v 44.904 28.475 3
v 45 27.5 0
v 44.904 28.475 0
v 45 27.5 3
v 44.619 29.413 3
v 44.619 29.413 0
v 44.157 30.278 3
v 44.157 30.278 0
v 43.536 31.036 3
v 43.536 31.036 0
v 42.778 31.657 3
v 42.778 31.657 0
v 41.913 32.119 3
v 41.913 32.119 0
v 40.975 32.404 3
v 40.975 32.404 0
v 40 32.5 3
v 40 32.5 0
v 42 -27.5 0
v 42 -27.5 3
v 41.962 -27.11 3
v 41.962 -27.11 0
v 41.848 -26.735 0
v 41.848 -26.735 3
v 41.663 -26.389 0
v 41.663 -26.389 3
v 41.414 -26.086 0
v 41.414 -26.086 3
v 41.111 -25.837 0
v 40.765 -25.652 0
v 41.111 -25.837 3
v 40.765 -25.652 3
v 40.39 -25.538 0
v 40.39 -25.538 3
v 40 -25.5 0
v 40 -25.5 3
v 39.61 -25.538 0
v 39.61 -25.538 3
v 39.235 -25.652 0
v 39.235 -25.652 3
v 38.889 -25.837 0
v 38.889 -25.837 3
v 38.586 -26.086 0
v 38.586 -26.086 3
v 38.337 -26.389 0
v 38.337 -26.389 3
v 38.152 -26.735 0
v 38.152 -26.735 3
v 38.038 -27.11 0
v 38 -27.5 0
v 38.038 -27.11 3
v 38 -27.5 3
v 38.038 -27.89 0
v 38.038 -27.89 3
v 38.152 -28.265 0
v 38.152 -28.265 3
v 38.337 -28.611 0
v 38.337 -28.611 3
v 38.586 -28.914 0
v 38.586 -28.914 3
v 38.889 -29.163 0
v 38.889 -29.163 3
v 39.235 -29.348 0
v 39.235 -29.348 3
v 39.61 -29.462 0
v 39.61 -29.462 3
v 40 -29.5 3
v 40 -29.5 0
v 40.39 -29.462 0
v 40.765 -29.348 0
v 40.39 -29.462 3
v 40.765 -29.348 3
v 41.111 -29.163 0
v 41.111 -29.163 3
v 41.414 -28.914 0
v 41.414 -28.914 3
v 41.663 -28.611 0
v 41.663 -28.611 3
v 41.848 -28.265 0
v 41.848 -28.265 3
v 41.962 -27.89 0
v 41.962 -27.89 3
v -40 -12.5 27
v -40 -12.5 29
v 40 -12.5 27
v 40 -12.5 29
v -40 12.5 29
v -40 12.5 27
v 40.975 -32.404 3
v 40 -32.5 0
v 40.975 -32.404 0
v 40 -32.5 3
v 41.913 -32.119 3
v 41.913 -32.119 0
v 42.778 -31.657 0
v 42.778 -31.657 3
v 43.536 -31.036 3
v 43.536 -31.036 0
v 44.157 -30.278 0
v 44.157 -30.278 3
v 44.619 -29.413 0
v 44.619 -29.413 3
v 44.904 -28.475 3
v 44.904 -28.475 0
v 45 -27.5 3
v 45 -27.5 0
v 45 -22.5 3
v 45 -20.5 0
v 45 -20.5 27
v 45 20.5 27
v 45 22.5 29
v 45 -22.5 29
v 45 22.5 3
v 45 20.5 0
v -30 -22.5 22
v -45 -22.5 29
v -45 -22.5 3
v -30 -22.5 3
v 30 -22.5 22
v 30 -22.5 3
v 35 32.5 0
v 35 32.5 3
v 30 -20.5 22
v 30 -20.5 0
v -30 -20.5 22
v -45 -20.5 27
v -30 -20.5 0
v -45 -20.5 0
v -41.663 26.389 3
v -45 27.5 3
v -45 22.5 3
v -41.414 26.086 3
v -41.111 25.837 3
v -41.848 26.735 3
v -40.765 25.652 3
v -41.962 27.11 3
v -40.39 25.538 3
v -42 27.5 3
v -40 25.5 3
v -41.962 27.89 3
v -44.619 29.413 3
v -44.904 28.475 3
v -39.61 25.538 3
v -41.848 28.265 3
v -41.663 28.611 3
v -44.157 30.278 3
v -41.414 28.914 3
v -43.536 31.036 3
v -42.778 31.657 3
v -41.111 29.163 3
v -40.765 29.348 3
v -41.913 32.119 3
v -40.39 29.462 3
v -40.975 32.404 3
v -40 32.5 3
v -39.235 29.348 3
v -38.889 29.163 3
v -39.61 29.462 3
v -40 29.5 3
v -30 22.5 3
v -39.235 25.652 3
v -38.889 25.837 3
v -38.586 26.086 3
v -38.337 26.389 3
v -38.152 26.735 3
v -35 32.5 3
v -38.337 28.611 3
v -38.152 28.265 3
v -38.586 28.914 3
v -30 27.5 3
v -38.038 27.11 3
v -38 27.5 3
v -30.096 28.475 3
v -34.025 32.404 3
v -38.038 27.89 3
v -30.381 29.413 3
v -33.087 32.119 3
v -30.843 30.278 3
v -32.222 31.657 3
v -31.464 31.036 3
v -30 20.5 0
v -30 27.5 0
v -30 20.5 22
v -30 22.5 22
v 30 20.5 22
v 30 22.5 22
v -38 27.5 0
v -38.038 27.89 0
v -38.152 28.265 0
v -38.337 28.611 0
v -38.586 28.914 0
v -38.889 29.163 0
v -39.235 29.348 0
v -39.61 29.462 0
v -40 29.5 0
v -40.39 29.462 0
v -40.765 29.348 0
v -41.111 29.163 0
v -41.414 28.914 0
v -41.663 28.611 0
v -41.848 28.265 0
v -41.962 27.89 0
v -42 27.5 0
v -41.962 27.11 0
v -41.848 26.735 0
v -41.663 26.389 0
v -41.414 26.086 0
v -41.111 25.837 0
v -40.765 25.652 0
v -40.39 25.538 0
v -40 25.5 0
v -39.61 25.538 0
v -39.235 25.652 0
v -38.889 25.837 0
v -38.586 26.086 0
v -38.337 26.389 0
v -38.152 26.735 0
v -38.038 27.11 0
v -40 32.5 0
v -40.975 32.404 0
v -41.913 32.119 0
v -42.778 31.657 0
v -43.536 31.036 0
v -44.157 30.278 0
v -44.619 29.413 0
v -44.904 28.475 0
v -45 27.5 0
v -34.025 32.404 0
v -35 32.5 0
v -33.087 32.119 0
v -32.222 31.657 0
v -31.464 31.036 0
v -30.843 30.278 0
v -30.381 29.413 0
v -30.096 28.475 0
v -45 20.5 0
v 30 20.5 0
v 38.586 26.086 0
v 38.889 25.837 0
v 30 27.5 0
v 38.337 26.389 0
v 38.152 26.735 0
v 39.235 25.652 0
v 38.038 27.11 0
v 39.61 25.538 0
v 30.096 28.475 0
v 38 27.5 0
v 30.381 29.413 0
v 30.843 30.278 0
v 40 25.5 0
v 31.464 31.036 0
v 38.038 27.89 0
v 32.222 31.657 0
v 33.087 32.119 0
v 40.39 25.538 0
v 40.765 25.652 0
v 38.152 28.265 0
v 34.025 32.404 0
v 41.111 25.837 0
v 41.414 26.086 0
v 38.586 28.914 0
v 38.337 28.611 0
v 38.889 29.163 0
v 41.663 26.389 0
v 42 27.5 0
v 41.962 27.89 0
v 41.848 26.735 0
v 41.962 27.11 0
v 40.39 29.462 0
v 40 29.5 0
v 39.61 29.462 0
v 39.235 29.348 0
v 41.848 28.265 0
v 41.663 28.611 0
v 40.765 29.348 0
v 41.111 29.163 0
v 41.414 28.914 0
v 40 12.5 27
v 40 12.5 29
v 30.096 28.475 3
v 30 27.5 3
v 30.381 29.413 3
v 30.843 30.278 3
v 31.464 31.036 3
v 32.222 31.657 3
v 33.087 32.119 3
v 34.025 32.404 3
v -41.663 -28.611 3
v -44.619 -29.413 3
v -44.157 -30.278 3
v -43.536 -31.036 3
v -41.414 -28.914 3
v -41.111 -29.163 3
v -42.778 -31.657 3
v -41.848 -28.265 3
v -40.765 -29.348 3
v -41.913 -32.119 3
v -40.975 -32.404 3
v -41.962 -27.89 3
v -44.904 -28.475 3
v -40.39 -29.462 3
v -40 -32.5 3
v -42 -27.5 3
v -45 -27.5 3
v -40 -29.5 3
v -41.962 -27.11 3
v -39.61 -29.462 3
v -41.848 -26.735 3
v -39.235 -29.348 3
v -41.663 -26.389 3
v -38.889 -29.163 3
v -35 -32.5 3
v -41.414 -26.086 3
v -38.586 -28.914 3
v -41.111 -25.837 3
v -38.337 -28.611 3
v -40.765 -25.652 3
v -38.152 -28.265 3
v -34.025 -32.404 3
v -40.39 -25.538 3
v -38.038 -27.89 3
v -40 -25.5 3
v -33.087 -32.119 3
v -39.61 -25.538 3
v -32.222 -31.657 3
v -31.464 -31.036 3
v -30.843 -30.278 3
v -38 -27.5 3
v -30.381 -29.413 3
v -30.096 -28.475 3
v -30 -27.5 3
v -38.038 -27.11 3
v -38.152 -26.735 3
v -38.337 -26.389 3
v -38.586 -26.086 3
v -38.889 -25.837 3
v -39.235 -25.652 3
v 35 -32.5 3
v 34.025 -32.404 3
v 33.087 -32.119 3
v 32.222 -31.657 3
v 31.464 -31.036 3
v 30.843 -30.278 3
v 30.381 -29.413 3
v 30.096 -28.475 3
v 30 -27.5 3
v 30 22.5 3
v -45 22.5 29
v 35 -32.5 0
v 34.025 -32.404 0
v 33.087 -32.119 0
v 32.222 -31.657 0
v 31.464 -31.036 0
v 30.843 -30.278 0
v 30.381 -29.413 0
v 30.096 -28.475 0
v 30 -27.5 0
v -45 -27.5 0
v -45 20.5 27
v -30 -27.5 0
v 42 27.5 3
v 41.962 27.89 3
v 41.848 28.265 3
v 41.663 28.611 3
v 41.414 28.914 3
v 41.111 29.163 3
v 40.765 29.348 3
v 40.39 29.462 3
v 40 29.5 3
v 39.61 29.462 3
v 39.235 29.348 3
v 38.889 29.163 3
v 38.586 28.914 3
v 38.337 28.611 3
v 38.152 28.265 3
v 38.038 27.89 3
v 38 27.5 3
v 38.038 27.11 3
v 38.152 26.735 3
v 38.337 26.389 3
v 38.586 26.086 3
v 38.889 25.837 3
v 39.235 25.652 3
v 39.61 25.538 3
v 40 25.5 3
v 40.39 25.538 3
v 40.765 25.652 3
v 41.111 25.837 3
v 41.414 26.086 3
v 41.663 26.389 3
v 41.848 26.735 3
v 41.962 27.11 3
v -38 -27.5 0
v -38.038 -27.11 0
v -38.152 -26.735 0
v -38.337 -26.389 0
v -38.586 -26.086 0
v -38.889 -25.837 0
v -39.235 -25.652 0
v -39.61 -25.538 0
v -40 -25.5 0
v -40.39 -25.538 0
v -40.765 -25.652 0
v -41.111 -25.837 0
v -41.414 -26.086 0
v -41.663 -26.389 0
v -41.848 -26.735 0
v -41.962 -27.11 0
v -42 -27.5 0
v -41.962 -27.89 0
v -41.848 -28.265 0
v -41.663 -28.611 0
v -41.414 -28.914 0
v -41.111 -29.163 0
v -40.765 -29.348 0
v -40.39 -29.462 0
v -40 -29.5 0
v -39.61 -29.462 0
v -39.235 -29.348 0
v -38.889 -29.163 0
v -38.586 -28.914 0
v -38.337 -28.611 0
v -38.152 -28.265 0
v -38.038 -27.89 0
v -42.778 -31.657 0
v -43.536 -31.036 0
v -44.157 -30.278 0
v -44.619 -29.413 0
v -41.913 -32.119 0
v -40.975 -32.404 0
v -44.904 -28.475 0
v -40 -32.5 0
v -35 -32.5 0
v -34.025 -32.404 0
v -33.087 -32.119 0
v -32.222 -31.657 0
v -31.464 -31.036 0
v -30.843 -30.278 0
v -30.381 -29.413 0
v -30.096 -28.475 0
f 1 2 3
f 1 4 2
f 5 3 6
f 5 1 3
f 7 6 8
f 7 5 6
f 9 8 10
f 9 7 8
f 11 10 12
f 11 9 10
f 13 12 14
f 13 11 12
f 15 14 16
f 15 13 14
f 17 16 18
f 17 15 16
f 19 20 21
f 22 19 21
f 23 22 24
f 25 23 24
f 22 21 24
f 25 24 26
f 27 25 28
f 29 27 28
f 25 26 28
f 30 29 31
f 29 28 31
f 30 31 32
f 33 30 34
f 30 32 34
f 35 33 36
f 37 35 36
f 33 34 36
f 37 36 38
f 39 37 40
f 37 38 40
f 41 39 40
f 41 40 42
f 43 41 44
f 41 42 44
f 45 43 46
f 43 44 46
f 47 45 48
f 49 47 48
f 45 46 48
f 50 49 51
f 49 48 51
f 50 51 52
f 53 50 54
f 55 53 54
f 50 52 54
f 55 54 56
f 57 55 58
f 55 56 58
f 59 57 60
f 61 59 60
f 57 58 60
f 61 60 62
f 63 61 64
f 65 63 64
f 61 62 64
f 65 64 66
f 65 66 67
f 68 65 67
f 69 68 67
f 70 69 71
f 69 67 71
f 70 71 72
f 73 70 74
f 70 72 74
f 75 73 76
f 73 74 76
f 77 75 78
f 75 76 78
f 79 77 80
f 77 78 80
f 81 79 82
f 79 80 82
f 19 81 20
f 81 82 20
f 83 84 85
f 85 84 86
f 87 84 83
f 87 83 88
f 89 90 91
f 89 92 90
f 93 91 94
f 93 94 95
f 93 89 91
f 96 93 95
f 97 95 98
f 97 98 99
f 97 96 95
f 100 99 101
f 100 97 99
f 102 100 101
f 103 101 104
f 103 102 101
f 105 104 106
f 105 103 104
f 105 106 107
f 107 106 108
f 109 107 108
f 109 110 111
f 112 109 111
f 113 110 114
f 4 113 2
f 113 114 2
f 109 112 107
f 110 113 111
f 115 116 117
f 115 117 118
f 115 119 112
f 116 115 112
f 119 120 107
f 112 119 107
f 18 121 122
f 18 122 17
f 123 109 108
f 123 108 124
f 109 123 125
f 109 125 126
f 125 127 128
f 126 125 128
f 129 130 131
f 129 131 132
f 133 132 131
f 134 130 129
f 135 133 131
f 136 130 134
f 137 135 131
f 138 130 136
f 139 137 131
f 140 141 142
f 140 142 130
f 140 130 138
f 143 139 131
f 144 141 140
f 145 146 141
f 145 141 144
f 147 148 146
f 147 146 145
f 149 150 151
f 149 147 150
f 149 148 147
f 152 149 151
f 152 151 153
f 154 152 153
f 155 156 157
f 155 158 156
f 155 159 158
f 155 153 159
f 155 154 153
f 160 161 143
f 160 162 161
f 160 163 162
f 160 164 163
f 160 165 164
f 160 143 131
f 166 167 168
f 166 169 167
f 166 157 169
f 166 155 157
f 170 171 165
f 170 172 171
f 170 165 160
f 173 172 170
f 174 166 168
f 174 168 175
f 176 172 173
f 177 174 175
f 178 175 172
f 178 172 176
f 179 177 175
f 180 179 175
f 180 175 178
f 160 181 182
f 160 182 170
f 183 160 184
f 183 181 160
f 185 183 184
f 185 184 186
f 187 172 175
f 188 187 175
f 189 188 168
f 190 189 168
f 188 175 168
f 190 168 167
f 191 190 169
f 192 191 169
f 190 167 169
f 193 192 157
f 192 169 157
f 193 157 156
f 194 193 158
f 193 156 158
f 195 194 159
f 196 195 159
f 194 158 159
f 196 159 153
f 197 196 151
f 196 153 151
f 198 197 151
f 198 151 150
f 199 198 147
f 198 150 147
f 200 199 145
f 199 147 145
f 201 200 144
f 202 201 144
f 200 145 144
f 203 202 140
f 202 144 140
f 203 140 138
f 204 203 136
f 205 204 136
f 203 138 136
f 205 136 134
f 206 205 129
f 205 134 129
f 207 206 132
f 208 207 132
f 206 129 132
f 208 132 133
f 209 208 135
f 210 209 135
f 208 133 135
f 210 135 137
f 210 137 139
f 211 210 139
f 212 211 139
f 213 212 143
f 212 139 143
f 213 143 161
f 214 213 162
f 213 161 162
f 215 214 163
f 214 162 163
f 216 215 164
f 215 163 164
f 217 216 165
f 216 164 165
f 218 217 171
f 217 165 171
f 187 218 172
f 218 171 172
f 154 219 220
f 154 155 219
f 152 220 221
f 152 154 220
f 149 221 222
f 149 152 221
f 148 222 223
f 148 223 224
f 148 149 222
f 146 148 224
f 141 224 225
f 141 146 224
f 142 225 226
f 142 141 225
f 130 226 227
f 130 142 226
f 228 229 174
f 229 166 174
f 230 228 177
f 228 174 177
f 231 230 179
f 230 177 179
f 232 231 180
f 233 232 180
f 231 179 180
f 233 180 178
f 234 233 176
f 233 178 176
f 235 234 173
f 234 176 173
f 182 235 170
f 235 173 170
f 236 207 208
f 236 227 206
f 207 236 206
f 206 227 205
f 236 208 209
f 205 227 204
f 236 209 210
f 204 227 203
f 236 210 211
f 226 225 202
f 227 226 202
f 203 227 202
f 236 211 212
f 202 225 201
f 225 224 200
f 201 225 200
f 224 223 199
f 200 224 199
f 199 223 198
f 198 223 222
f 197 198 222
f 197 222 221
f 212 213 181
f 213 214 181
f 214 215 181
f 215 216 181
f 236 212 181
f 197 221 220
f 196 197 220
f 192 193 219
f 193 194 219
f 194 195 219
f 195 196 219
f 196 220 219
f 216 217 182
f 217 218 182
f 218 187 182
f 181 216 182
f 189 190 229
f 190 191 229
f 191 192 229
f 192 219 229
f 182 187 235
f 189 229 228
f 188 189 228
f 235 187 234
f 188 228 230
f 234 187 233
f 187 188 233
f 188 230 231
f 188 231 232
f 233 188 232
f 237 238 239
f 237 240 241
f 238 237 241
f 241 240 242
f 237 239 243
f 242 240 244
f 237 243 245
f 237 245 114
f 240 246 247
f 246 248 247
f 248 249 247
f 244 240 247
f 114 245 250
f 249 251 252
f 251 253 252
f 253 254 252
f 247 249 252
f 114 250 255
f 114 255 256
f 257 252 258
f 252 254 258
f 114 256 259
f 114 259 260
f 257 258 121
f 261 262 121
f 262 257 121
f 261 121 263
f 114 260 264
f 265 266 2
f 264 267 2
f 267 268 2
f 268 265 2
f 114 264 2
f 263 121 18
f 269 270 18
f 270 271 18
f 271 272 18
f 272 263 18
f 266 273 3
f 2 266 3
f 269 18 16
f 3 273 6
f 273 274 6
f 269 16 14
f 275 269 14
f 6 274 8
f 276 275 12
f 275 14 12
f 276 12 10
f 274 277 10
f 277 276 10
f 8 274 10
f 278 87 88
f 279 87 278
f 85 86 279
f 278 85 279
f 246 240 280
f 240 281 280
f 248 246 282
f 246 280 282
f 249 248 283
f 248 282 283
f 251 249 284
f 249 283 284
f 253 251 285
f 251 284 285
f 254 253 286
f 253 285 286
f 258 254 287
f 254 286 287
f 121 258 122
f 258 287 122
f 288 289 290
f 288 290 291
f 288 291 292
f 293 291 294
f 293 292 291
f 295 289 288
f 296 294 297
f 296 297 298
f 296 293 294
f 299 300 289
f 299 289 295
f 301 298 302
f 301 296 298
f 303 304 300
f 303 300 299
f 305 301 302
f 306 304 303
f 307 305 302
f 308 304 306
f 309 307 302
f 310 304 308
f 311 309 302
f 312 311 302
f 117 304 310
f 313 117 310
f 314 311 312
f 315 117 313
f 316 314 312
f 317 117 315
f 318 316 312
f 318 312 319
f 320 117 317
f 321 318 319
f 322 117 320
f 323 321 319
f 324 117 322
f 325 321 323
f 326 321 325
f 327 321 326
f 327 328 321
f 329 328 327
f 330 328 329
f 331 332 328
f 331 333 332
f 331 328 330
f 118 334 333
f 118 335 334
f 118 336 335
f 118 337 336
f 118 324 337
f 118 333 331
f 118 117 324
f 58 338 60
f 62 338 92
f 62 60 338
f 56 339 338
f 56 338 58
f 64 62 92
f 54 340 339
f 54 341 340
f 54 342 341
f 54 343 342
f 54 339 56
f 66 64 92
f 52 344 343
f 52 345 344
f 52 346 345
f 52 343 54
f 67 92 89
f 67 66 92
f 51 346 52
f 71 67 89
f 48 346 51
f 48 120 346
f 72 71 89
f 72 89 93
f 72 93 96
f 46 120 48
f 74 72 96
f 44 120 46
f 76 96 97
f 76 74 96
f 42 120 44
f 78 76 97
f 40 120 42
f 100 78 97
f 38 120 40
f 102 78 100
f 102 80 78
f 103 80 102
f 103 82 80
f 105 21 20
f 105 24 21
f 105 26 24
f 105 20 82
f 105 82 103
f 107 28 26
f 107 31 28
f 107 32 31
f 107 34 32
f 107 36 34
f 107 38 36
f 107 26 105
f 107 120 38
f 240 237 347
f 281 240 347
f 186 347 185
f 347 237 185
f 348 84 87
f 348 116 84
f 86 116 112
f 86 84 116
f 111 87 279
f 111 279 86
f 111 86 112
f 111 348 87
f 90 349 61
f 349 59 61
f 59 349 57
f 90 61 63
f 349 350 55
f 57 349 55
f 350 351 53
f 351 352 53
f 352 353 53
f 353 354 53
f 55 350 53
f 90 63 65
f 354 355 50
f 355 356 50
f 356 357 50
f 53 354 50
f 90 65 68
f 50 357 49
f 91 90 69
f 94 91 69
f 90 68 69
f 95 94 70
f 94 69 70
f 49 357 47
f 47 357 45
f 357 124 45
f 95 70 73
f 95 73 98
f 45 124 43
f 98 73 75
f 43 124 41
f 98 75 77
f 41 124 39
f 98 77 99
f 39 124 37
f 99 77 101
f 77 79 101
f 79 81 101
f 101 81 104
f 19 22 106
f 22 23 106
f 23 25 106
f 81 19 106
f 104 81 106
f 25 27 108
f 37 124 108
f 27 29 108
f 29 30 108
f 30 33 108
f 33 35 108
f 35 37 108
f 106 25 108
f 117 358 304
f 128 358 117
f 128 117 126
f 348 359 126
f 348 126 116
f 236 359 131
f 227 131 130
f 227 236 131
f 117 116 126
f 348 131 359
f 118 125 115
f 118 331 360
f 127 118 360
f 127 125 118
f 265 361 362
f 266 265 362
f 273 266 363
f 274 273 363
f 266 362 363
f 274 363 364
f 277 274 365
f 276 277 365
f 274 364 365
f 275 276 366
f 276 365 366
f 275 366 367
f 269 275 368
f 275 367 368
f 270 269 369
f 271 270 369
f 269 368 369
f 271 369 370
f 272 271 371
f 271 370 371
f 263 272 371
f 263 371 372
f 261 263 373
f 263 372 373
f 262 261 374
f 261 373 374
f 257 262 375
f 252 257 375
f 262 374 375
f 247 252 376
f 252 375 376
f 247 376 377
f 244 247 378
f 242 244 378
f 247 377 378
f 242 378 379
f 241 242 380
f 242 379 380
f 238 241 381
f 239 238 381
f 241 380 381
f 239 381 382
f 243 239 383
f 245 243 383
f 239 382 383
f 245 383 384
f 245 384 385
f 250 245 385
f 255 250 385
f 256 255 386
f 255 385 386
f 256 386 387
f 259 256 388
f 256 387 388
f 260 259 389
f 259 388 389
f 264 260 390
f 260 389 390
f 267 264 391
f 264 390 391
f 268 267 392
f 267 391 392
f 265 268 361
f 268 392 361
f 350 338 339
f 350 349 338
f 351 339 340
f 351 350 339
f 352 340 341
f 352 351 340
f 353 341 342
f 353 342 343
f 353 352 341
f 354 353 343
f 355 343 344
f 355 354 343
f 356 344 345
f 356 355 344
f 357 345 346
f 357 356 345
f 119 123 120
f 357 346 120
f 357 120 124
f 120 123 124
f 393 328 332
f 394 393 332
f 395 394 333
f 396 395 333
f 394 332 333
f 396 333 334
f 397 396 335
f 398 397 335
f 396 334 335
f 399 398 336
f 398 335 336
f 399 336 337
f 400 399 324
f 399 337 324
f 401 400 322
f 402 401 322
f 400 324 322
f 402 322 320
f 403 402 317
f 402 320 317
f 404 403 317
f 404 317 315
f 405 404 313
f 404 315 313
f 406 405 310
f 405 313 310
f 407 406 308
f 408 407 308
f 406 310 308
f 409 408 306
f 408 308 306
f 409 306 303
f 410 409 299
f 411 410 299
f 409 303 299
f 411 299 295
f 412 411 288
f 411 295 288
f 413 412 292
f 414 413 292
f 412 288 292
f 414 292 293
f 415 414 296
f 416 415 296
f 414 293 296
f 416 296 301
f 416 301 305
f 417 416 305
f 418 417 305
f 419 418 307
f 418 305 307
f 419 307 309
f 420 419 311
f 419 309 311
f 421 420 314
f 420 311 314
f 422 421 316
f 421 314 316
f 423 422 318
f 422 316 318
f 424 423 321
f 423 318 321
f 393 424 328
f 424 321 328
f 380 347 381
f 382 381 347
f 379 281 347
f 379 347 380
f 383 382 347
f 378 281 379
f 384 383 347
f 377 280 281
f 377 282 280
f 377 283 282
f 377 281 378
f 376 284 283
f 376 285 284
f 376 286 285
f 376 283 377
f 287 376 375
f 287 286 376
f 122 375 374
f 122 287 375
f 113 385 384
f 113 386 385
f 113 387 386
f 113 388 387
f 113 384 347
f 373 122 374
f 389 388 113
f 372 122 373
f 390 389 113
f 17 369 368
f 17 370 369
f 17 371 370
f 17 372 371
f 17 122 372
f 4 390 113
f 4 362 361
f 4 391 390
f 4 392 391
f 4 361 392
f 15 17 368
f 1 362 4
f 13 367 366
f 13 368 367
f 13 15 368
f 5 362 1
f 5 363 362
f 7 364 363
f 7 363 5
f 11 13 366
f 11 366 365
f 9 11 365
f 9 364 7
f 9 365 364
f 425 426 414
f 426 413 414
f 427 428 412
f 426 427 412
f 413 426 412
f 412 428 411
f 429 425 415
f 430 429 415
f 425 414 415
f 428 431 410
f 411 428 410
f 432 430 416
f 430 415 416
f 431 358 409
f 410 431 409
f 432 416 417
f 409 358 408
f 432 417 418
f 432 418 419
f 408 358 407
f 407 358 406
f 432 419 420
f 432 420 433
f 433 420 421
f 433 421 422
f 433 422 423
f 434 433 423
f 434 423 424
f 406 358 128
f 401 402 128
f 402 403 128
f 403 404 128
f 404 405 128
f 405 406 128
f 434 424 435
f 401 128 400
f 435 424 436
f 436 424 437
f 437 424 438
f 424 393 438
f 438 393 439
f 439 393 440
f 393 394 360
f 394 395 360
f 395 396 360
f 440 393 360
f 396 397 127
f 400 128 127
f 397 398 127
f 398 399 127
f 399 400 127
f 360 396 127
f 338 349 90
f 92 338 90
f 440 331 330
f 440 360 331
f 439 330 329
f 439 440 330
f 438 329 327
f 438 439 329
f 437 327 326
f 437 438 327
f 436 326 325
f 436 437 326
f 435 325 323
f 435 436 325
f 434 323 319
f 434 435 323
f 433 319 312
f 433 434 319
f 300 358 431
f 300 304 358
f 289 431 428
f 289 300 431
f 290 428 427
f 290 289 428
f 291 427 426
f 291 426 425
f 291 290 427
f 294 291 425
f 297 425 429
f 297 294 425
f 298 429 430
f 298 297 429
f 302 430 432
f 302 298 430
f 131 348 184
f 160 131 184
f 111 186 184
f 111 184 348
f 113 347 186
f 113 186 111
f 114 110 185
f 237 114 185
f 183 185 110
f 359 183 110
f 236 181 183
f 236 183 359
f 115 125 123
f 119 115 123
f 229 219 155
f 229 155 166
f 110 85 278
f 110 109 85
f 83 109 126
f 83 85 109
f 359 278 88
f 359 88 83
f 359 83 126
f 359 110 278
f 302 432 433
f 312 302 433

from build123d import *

# Parameters (mm, degrees)
SKETCH1_W           = 90
SKETCH1_H           = 65
BOSS_EXTRUDE1_DEPTH = 3
FILLET4_R           = 5
FILLET5_R           = 5
FILLET6_R           = 5
FILLET7_R           = 5
SKETCH4_W           = 90
SKETCH4_H           = 45
BOSS_EXTRUDE2_DEPTH = 26
SKETCH6_W           = 90
SKETCH6_H           = 41
CUT_EXTRUDE2_DEPTH  = 27
SKETCH5_W           = 80
SKETCH5_H           = 25
CUT_EXTRUDE3_DEPTH  = 3
SKETCH7_R           = 2
CUT_EXTRUDE4_DEPTH  = 3
SKETCH8_R           = 2
CUT_EXTRUDE5_DEPTH  = 3
SKETCH10_W          = 60
SKETCH10_H          = 22
CUT_EXTRUDE7_DEPTH  = 12
FILLET9_R           = 5
FILLET10_R          = 5
SKETCH11_W          = 60
SKETCH11_H          = 22
CUT_EXTRUDE8_DEPTH  = 12
FILLET11_R          = 5
FILLET12_R          = 5


with BuildPart() as part:
    # Sketch1 → Boss-Extrude1 (new body)
    with BuildSketch(Plane.XY):
        Rectangle(SKETCH1_W, SKETCH1_H)
    extrude(amount=BOSS_EXTRUDE1_DEPTH)

    # Fillet4
    fillet4_edges = [part.edges().sort_by_distance(p)[0] for p in [
        (-45, -32.5, 1.5),
    ]]
    fillet(fillet4_edges, radius=FILLET4_R)

    # Fillet5
    fillet5_edges = [part.edges().sort_by_distance(p)[0] for p in [
        (45, -32.5, 1.5),
    ]]
    fillet(fillet5_edges, radius=FILLET5_R)

    # Fillet6
    fillet6_edges = [part.edges().sort_by_distance(p)[0] for p in [
        (45, 32.5, 1.5),
    ]]
    fillet(fillet6_edges, radius=FILLET6_R)

    # Fillet7
    fillet7_edges = [part.edges().sort_by_distance(p)[0] for p in [
        (-45, 32.5, 1.5),
    ]]
    fillet(fillet7_edges, radius=FILLET7_R)

    # Sketch4 → Boss-Extrude2 (add)
    with BuildSketch(Plane.XY.offset(3)):
        Rectangle(SKETCH4_W, SKETCH4_H)
    extrude(amount=BOSS_EXTRUDE2_DEPTH)

    # Sketch6 → Cut-Extrude2 (cut)
    with BuildSketch(Plane(origin=(0, 0, 0), x_dir=(-1, 0, 0), z_dir=(0, 0, -1))):
        Rectangle(SKETCH6_W, SKETCH6_H)
    extrude(amount=-CUT_EXTRUDE2_DEPTH, mode=Mode.SUBTRACT)

    # Sketch5 → Cut-Extrude3 (cut)
    with BuildSketch(Plane.XY.offset(29)):
        Rectangle(SKETCH5_W, SKETCH5_H)
    extrude(amount=-CUT_EXTRUDE3_DEPTH, mode=Mode.SUBTRACT)

    # Sketch7 → Cut-Extrude4 (cut)
    with BuildSketch(Plane.XY.offset(3)):
        with Locations((40, -27.5)):
            Circle(SKETCH7_R)
        with Locations((-40, -27.5)):
            Circle(SKETCH7_R)
    extrude(amount=-CUT_EXTRUDE4_DEPTH, mode=Mode.SUBTRACT)

    # Sketch8 → Cut-Extrude5 (cut)
    with BuildSketch(Plane.XY.offset(3)):
        with Locations((-40, 27.5)):
            Circle(SKETCH8_R)
        with Locations((40, 27.5)):
            Circle(SKETCH8_R)
    extrude(amount=-CUT_EXTRUDE5_DEPTH, mode=Mode.SUBTRACT)

    # Sketch10 → Cut-Extrude7 (cut)
    with BuildSketch(Plane.XZ.offset(-20.5)):
        with Locations((0, 11)):
            Rectangle(SKETCH10_W, SKETCH10_H)
    extrude(amount=-CUT_EXTRUDE7_DEPTH, mode=Mode.SUBTRACT)

    # Fillet9
    fillet9_edges = [part.edges().sort_by_distance(p)[0] for p in [
        (-30, 32.5, 1.5),
    ]]
    fillet(fillet9_edges, radius=FILLET9_R)

    # Fillet10
    fillet10_edges = [part.edges().sort_by_distance(p)[0] for p in [
        (30, 32.5, 1.5),
    ]]
    fillet(fillet10_edges, radius=FILLET10_R)

    # Sketch11 → Cut-Extrude8 (cut)
    with BuildSketch(Plane(origin=(0, -20.5, 0), x_dir=(1, 0, 0), z_dir=(0, 1, 0))):
        with Locations((0, -11)):
            Rectangle(SKETCH11_W, SKETCH11_H)
    extrude(amount=-CUT_EXTRUDE8_DEPTH, mode=Mode.SUBTRACT)

    # Fillet11
    fillet11_edges = [part.edges().sort_by_distance(p)[0] for p in [
        (30, -32.5, 1.5),
    ]]
    fillet(fillet11_edges, radius=FILLET11_R)

    # Fillet12
    fillet12_edges = [part.edges().sort_by_distance(p)[0] for p in [
        (-30, -32.5, 1.5),
    ]]
    fillet(fillet12_edges, radius=FILLET12_R)


solid = part.part
